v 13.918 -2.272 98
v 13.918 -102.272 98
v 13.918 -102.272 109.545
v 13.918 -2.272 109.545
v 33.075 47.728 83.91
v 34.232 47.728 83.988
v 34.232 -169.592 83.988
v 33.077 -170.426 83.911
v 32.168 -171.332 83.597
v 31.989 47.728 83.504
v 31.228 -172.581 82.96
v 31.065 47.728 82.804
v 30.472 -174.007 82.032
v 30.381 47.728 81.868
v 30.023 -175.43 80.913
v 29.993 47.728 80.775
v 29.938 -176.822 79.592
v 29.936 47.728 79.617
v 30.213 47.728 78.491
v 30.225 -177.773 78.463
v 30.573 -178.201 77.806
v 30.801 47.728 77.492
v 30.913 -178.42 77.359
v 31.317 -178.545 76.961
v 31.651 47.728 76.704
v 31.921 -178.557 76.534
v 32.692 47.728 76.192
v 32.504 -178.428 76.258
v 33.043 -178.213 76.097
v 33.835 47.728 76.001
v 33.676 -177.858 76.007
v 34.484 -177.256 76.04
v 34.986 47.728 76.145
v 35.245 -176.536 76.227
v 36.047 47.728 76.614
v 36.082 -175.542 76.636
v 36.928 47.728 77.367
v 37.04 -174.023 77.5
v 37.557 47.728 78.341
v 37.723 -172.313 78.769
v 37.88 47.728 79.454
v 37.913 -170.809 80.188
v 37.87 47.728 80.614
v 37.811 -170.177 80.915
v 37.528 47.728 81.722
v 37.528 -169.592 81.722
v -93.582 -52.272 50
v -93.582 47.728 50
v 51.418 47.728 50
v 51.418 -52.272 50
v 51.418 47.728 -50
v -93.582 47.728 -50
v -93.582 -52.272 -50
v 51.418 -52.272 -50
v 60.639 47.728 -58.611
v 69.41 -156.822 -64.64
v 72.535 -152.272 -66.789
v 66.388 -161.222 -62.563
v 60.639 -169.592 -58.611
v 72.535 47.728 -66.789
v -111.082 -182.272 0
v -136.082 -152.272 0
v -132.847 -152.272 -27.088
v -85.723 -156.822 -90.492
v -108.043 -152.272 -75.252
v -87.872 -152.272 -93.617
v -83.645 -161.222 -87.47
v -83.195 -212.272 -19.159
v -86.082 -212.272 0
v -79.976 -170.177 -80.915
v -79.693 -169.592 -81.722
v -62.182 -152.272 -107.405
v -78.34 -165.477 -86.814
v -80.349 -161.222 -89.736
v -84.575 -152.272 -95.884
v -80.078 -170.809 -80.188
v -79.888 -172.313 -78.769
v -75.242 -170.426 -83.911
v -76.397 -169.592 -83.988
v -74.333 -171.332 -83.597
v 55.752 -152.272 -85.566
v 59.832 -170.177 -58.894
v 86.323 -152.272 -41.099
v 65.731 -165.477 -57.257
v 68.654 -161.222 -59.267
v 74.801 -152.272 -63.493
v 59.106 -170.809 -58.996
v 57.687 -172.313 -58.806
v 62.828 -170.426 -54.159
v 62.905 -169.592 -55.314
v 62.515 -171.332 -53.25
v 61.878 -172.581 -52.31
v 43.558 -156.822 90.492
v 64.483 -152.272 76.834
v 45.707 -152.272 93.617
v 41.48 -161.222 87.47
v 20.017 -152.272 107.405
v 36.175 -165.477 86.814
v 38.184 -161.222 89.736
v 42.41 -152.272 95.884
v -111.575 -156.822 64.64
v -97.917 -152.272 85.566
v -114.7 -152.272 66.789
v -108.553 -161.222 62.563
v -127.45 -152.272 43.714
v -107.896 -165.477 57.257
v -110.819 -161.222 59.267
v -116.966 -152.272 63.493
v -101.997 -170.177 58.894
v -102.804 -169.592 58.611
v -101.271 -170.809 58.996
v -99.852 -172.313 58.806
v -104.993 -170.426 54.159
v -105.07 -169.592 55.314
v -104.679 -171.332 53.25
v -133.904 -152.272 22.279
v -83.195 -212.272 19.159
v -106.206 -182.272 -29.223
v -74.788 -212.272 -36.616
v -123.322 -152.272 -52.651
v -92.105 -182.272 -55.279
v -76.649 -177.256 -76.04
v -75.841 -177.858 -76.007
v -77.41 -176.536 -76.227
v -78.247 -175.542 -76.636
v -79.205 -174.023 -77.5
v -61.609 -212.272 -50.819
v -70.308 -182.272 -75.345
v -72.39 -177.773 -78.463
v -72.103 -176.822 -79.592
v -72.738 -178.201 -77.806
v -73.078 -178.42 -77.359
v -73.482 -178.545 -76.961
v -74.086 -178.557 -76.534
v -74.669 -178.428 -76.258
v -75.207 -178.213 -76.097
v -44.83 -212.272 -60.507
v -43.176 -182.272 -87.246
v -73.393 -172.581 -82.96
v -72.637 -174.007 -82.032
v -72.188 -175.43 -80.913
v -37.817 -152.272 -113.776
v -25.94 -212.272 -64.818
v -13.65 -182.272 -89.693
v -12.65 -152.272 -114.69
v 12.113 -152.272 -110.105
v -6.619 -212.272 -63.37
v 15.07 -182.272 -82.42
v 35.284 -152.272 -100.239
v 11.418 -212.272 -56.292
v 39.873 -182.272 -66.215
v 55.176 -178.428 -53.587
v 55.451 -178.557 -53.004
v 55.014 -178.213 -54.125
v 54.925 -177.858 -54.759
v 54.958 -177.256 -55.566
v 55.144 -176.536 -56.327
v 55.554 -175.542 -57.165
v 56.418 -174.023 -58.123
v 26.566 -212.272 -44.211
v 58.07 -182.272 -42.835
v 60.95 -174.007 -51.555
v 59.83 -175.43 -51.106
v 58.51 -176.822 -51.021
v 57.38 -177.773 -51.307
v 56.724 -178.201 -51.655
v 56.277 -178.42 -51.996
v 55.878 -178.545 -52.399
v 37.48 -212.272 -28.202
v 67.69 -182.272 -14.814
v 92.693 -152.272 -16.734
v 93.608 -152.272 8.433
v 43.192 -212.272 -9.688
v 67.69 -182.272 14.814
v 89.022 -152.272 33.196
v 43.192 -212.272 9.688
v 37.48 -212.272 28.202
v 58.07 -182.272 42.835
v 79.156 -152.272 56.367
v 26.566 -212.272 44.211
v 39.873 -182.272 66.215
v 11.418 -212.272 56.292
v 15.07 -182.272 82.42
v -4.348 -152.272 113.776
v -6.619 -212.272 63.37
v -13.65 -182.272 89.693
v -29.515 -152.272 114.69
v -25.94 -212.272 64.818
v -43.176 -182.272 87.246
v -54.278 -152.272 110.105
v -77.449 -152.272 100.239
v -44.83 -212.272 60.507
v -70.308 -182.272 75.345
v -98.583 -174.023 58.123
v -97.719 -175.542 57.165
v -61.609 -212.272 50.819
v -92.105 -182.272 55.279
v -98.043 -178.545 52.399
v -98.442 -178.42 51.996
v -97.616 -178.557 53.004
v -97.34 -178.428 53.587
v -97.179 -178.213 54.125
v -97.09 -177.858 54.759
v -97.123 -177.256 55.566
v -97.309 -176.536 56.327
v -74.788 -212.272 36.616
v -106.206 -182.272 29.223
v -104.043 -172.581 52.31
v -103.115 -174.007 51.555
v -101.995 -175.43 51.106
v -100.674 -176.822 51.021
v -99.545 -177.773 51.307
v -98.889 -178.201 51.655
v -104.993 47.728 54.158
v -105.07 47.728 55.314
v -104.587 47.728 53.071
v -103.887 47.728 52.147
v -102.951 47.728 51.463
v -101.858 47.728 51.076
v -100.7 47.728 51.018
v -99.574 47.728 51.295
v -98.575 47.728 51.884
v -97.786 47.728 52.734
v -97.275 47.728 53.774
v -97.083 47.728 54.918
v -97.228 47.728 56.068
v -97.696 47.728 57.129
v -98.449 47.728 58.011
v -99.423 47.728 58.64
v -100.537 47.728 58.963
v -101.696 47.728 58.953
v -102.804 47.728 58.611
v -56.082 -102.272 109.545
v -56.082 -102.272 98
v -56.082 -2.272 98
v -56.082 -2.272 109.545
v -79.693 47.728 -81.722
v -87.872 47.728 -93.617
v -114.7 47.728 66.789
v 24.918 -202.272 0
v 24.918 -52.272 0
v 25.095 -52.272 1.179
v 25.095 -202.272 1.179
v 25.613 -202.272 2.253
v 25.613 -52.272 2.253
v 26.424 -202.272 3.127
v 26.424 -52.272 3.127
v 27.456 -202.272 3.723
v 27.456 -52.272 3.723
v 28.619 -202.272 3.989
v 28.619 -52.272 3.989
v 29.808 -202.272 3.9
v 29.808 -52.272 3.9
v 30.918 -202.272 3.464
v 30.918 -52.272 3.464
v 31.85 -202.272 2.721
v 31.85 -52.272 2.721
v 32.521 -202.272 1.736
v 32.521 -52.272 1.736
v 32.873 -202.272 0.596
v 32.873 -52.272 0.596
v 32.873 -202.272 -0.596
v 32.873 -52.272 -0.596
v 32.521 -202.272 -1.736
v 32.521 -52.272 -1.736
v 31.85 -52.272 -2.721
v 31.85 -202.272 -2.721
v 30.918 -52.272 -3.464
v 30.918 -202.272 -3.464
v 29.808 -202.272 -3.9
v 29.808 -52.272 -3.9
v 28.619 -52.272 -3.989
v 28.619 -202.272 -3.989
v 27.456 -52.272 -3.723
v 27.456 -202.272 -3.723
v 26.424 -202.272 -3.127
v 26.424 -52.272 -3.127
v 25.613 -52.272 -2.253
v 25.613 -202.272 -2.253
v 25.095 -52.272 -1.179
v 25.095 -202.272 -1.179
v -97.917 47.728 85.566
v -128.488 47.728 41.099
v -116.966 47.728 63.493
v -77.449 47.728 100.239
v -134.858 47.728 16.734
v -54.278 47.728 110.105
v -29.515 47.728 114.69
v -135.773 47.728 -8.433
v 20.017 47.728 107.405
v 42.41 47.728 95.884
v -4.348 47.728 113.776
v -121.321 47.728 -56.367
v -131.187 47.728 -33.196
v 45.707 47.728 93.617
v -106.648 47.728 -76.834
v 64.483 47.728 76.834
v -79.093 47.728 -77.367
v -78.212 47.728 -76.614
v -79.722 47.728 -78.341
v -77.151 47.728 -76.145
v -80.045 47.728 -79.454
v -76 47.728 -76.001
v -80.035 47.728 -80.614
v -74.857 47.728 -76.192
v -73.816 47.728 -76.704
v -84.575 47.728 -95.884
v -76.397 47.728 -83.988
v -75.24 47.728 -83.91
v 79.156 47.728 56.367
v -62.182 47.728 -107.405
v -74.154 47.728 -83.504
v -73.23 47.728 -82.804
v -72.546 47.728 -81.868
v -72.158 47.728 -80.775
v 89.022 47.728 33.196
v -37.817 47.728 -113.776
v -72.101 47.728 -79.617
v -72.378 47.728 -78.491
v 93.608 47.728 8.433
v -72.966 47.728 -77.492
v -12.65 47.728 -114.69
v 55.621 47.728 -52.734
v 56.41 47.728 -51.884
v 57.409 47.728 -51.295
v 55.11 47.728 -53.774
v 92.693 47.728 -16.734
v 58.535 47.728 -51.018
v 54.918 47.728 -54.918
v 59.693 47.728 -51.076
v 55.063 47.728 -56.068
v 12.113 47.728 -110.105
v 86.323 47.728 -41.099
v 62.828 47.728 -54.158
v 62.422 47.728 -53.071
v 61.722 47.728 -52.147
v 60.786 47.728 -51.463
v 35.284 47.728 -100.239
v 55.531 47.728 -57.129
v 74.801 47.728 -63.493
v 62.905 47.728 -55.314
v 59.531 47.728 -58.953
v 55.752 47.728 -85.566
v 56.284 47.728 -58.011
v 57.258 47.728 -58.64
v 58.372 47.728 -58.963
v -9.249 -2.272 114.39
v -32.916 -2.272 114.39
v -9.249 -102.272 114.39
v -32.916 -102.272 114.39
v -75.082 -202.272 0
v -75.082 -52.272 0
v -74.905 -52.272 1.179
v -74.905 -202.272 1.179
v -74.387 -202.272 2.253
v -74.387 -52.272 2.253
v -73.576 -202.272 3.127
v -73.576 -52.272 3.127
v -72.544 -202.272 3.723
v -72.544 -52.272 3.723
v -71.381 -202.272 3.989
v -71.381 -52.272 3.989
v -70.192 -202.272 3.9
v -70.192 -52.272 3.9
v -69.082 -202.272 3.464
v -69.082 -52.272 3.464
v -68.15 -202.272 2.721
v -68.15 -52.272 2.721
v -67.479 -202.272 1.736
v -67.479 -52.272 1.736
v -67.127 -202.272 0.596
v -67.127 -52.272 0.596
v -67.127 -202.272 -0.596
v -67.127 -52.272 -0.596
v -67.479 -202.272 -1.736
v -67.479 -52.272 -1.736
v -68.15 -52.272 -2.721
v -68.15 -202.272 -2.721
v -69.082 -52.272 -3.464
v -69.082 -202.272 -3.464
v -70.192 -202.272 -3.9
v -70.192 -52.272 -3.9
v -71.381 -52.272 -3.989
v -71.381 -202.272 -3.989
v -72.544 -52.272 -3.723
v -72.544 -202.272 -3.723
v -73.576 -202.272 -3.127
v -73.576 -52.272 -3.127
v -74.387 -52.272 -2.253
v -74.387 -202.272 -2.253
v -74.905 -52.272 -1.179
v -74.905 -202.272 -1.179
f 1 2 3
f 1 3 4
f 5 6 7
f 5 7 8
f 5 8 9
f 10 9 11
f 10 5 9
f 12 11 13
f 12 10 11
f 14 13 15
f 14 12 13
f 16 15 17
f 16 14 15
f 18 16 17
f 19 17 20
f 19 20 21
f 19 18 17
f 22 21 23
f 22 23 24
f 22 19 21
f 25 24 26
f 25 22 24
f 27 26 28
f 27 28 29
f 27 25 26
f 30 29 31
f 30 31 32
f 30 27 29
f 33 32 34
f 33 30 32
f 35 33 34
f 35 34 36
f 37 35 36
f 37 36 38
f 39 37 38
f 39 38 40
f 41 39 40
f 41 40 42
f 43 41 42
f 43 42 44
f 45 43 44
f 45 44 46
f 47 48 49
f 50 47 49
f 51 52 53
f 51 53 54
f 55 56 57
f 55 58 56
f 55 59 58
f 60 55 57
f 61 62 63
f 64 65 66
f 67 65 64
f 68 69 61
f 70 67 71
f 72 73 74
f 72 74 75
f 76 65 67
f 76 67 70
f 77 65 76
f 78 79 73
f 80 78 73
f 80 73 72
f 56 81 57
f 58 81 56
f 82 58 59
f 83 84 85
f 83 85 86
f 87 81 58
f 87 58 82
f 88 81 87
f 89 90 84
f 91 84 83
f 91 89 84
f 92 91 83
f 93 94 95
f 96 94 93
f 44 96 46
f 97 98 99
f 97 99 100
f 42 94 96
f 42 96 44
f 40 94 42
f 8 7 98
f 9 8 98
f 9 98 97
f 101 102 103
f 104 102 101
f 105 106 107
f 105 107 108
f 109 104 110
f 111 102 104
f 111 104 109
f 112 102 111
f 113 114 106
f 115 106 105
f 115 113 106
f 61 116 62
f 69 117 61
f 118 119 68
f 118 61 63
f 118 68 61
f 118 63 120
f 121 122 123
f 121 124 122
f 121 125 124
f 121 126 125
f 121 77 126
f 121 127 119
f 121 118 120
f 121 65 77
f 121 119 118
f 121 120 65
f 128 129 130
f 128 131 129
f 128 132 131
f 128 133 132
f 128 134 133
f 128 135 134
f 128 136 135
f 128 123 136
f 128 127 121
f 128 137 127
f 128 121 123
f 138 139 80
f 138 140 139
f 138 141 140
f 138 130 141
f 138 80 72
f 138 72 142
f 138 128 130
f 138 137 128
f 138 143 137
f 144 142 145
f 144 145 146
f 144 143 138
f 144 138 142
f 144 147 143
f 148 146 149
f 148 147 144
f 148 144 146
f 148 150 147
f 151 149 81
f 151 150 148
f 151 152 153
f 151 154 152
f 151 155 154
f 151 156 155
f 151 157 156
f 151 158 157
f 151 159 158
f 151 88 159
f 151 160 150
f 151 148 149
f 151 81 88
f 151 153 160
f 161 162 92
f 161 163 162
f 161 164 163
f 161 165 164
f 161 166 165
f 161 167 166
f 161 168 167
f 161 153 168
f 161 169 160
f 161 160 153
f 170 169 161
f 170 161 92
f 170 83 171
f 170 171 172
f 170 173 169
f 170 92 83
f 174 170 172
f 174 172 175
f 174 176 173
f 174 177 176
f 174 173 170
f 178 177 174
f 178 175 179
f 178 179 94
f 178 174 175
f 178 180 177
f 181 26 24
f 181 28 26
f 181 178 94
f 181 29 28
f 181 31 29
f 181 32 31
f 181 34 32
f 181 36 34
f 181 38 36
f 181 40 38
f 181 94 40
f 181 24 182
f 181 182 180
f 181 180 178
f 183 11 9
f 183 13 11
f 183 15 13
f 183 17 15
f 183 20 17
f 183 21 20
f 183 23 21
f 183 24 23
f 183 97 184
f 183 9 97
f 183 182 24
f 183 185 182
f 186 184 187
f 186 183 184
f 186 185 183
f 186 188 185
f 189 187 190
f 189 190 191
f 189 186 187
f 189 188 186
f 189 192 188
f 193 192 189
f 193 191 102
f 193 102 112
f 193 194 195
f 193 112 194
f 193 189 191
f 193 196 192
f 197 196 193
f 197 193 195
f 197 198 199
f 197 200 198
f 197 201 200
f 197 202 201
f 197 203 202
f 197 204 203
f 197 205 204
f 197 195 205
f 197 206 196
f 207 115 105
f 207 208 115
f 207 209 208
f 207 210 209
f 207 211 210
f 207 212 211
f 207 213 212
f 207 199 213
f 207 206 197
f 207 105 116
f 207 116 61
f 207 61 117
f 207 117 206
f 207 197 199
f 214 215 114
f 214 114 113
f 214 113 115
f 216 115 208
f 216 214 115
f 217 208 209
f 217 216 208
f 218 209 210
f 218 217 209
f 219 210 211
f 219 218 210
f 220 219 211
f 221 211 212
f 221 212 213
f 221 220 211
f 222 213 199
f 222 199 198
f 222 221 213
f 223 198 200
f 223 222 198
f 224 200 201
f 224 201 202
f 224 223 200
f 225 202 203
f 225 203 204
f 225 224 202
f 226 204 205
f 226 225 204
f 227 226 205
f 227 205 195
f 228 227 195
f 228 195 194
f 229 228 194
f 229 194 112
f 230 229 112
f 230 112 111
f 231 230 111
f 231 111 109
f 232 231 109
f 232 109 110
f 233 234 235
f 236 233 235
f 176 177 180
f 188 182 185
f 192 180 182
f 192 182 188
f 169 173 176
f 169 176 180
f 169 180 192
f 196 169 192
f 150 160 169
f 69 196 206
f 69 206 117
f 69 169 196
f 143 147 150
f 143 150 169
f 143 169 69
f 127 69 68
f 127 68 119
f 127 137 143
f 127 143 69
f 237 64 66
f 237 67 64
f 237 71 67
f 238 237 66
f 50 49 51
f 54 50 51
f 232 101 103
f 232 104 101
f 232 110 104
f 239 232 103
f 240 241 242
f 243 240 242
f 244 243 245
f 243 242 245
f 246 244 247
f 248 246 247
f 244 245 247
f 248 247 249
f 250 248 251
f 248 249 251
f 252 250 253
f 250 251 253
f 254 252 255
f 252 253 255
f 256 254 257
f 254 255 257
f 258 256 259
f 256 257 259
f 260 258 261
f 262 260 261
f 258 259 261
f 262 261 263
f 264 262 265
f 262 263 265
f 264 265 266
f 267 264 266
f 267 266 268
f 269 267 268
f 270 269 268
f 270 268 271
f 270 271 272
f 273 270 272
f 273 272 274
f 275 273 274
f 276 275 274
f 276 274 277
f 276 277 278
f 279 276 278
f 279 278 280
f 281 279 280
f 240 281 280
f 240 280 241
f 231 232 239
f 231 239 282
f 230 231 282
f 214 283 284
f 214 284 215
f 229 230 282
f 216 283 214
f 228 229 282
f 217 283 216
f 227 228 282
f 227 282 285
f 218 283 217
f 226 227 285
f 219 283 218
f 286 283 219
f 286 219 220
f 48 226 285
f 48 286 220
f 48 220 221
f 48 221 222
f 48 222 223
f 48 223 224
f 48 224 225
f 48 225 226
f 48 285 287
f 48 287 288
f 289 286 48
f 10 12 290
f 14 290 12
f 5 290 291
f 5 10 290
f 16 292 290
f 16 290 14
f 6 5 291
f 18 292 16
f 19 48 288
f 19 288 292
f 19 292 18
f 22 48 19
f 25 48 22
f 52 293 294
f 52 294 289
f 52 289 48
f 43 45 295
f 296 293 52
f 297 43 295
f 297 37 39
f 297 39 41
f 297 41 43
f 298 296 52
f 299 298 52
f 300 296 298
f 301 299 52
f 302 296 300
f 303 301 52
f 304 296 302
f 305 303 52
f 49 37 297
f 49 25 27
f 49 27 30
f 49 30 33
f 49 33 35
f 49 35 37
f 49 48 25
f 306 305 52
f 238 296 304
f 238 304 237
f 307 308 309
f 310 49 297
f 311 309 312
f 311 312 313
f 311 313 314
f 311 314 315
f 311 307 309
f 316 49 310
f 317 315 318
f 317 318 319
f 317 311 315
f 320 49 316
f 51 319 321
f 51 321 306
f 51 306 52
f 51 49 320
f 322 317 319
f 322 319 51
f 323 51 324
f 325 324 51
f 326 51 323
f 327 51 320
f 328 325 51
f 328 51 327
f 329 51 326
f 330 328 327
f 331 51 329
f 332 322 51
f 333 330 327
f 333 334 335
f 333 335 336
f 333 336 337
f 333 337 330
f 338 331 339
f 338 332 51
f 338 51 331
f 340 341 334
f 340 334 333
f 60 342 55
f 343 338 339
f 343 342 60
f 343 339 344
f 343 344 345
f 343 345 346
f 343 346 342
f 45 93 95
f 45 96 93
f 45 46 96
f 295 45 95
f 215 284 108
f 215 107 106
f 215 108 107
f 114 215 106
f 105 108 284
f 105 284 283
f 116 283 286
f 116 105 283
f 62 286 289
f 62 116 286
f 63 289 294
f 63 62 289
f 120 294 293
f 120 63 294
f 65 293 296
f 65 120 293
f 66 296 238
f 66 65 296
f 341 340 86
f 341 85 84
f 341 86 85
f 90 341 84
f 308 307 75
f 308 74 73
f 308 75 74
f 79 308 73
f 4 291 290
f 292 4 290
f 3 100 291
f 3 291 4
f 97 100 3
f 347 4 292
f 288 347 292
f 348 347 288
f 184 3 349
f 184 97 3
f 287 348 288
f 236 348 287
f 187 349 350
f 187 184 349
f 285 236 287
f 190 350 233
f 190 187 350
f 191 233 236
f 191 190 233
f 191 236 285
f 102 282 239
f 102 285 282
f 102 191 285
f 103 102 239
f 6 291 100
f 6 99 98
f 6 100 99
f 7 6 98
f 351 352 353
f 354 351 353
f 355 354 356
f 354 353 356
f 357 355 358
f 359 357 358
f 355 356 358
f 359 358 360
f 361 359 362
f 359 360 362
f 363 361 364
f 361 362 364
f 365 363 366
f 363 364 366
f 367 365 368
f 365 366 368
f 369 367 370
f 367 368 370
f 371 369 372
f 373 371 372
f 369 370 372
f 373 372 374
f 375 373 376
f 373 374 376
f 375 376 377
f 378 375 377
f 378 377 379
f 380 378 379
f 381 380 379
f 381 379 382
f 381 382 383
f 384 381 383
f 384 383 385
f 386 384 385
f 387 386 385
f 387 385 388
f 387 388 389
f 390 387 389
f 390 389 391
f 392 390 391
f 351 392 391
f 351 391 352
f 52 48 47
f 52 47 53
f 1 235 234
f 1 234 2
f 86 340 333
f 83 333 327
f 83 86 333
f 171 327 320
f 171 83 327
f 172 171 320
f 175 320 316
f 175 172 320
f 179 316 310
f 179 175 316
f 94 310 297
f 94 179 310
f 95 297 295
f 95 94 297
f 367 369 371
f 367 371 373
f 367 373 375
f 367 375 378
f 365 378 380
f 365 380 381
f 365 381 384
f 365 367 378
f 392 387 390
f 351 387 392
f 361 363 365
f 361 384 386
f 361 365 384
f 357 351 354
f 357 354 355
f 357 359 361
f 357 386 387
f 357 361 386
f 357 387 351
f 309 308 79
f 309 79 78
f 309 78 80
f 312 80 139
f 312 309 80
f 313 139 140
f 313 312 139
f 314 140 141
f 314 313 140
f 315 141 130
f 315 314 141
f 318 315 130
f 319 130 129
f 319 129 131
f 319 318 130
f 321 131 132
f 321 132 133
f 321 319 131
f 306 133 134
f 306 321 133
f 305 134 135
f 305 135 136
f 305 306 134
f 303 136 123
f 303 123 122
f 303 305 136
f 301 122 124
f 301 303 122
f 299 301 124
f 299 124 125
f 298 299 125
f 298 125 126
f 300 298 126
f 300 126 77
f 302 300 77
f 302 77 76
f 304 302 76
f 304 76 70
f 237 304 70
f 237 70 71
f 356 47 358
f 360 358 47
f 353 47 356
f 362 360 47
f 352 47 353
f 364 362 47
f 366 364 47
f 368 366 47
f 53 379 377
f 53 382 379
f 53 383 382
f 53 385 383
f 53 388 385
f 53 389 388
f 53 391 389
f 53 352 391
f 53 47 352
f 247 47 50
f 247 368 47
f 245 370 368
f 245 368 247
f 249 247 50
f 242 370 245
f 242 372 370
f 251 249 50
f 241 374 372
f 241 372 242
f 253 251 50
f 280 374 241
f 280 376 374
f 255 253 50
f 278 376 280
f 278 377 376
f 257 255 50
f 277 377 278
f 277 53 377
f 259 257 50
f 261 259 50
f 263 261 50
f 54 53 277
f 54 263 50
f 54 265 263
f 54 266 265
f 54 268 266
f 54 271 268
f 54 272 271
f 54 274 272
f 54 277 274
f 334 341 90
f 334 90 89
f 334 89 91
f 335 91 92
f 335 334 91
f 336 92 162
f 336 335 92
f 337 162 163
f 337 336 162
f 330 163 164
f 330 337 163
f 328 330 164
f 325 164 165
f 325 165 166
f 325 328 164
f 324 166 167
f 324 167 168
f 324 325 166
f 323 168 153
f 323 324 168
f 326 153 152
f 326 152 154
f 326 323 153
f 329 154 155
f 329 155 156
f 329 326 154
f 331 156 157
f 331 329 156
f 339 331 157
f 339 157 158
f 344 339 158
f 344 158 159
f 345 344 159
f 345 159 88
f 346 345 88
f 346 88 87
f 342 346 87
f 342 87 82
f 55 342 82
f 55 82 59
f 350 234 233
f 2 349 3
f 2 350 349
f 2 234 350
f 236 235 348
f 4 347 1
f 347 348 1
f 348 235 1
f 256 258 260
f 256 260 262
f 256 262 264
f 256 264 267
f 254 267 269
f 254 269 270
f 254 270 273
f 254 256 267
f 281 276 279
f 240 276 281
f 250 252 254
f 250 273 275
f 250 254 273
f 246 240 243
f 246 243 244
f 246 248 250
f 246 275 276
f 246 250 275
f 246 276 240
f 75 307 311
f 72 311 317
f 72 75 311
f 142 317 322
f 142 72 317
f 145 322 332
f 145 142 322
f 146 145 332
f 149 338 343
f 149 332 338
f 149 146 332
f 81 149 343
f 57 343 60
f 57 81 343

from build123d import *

# Parameters (mm, degrees)
TAGLIO_ESTRUSIONE1_REACH = 262
SCHIZZO3_W               = 145
SCHIZZO3_H               = 100
TAGLIO_ESTRUSIONE2_DEPTH = 100
SCHIZZO4_R               = 4
TAGLIO_ESTRUSIONE3_DEPTH = 250
SCHIZZO6_W               = 70
SCHIZZO6_H               = 100
TAGLIO_ESTRUSIONE4_DEPTH = 18.0000001


with BuildPart() as part:
    # Schizzo1 → Rivoluzione1 (revolve)
    with BuildSketch(Plane.XY, mode=Mode.PRIVATE) as rivoluzione1_sk:
        Polygon((-21.082480081, 47.728392405), (93.917519919, 47.728392405), (93.917519919, -152.271607595), (43.917519919, -212.271607595), (-21.082480081, -212.271607595), align=None)
    revolve(rivoluzione1_sk.sketch.rotate(Axis((-21.082480081, 47.728392405, 0), (0, -1, 0)), 180), axis=Axis((-21.082480081, 47.728392405, 0), (0, -1, 0)))  # turned: the seam where the file's is

    # Taglio-Estrusione1: up to this cone (the profile starts inside it)
    taglio_estrusione1_end = Plane(origin=(-21.082480081, 47.728392, 0), z_dir=(0, 1, 0)).offset(-337.999998595) * Cone(1e-06, 735.13888827, 882.166664924, align=(Align.CENTER, Align.CENTER, Align.MIN), mode=Mode.PRIVATE)
    # Schizzo2 → Taglio-Estrusione1 (cut, up to the surface)
    with BuildSketch(Plane(origin=(0, 47.728392405, 0), x_dir=(1, 0, 0), z_dir=(0, 1, 0)), mode=Mode.PRIVATE) as taglio_estrusione1_sk1:
        with BuildLine():
            Line((60.639027234, 58.610597259), (72.534951309, 66.78904506))
            ThreePointArc((72.534951309, 66.78904506), (73.682341202, 65.150814632), (74.8010666, 63.492877363))
            Line((74.8010666, 63.492877363), (62.905142526, 55.314429562))
            ThreePointArc((62.905142526, 55.314429562), (55.621352222, 52.733884708), (60.639027234, 58.610597259))
        make_face()
    taglio_estrusione1_tool1 = extrude(taglio_estrusione1_sk1.sketch, amount=-TAGLIO_ESTRUSIONE1_REACH, mode=Mode.PRIVATE) & taglio_estrusione1_end
    add(taglio_estrusione1_tool1.solids().sort_by_distance((63.650663, 47.728392, -58.254036))[0], mode=Mode.SUBTRACT)
    # Schizzo2 → Taglio-Estrusione1 (cut, up to the surface)
    with BuildSketch(Plane(origin=(0, 47.728392405, 0), x_dir=(1, 0, 0), z_dir=(0, 1, 0)), mode=Mode.PRIVATE) as taglio_estrusione1_sk2:
        with BuildLine():
            Line((37.528117178, -81.721507315), (45.706564979, -93.617431389))
            ThreePointArc((45.706564979, -93.617431389), (44.068334551, -94.764821283), (42.410397283, -95.883546681))
            Line((42.410397283, -95.883546681), (34.231949481, -83.987622606))
            ThreePointArc((34.231949481, -83.987622606), (31.651404628, -76.703832303), (37.528117178, -81.721507315))
        make_face()
    taglio_estrusione1_tool2 = extrude(taglio_estrusione1_sk2.sketch, amount=-TAGLIO_ESTRUSIONE1_REACH, mode=Mode.PRIVATE) & taglio_estrusione1_end
    add(taglio_estrusione1_tool2.solids().sort_by_distance((37.171556, 47.728392, 84.733143))[0], mode=Mode.SUBTRACT)
    # Schizzo2 → Taglio-Estrusione1 (cut, up to the surface)
    with BuildSketch(Plane(origin=(0, 47.728392405, 0), x_dir=(1, 0, 0), z_dir=(0, 1, 0)), mode=Mode.PRIVATE) as taglio_estrusione1_sk3:
        with BuildLine():
            Line((-102.803987396, -58.610597259), (-114.69991147, -66.78904506))
            ThreePointArc((-114.69991147, -66.78904506), (-115.847301364, -65.150814632), (-116.966026762, -63.492877363))
            Line((-116.966026762, -63.492877363), (-105.070102687, -55.314429562))
            ThreePointArc((-105.070102687, -55.314429562), (-97.786312384, -52.733884708), (-102.803987396, -58.610597259))
        make_face()
    taglio_estrusione1_tool3 = extrude(taglio_estrusione1_sk3.sketch, amount=-TAGLIO_ESTRUSIONE1_REACH, mode=Mode.PRIVATE) & taglio_estrusione1_end
    add(taglio_estrusione1_tool3.solids().sort_by_distance((-105.815623, 47.728392, 58.254036))[0], mode=Mode.SUBTRACT)
    # Schizzo2 → Taglio-Estrusione1 (cut, up to the surface)
    with BuildSketch(Plane(origin=(0, 47.728392405, 0), x_dir=(1, 0, 0), z_dir=(0, 1, 0)), mode=Mode.PRIVATE) as taglio_estrusione1_sk4:
        with BuildLine():
            Line((-79.69307734, 81.721507315), (-87.871525141, 93.617431389))
            ThreePointArc((-87.871525141, 93.617431389), (-86.233294713, 94.764821283), (-84.575357444, 95.883546681))
            Line((-84.575357444, 95.883546681), (-76.396909643, 83.987622606))
            ThreePointArc((-76.396909643, 83.987622606), (-73.816364789, 76.703832303), (-79.69307734, 81.721507315))
        make_face()
    taglio_estrusione1_tool4 = extrude(taglio_estrusione1_sk4.sketch, amount=-TAGLIO_ESTRUSIONE1_REACH, mode=Mode.PRIVATE) & taglio_estrusione1_end
    add(taglio_estrusione1_tool4.solids().sort_by_distance((-79.336516, 47.728392, -84.733143))[0], mode=Mode.SUBTRACT)

    # Schizzo3 → Taglio-Estrusione2 (cut)
    with BuildSketch(Plane(origin=(0, 47.728392405, 0), x_dir=(1, 0, 0), z_dir=(0, 1, 0))):
        with Locations((-21.082480081, 0)):
            Rectangle(SCHIZZO3_W, SCHIZZO3_H)
    extrude(amount=-TAGLIO_ESTRUSIONE2_DEPTH, mode=Mode.SUBTRACT)

    # Schizzo4 → Taglio-Estrusione3 (cut)
    with BuildSketch(Plane(origin=(0, 47.728392405, 0), x_dir=(1, 0, 0), z_dir=(0, 1, 0))):
        with Locations(Location((-71.082480081, 0, 0), (0, 0, 180))):  # turned: the seam where the file's is
            Circle(SCHIZZO4_R)
        with Locations(Location((28.917519919, 0, 0), (0, 0, 180))):  # turned: the seam where the file's is
            Circle(SCHIZZO4_R)
    extrude(amount=-TAGLIO_ESTRUSIONE3_DEPTH, mode=Mode.SUBTRACT)

    # Schizzo6 → Taglio-Estrusione4 (cut, through all)
    with BuildSketch(Plane.XY.offset(98)):
        with Locations((-21.082480081, -52.271607595)):
            Rectangle(SCHIZZO6_W, SCHIZZO6_H)
    extrude(amount=TAGLIO_ESTRUSIONE4_DEPTH, mode=Mode.SUBTRACT)


solid = part.part
